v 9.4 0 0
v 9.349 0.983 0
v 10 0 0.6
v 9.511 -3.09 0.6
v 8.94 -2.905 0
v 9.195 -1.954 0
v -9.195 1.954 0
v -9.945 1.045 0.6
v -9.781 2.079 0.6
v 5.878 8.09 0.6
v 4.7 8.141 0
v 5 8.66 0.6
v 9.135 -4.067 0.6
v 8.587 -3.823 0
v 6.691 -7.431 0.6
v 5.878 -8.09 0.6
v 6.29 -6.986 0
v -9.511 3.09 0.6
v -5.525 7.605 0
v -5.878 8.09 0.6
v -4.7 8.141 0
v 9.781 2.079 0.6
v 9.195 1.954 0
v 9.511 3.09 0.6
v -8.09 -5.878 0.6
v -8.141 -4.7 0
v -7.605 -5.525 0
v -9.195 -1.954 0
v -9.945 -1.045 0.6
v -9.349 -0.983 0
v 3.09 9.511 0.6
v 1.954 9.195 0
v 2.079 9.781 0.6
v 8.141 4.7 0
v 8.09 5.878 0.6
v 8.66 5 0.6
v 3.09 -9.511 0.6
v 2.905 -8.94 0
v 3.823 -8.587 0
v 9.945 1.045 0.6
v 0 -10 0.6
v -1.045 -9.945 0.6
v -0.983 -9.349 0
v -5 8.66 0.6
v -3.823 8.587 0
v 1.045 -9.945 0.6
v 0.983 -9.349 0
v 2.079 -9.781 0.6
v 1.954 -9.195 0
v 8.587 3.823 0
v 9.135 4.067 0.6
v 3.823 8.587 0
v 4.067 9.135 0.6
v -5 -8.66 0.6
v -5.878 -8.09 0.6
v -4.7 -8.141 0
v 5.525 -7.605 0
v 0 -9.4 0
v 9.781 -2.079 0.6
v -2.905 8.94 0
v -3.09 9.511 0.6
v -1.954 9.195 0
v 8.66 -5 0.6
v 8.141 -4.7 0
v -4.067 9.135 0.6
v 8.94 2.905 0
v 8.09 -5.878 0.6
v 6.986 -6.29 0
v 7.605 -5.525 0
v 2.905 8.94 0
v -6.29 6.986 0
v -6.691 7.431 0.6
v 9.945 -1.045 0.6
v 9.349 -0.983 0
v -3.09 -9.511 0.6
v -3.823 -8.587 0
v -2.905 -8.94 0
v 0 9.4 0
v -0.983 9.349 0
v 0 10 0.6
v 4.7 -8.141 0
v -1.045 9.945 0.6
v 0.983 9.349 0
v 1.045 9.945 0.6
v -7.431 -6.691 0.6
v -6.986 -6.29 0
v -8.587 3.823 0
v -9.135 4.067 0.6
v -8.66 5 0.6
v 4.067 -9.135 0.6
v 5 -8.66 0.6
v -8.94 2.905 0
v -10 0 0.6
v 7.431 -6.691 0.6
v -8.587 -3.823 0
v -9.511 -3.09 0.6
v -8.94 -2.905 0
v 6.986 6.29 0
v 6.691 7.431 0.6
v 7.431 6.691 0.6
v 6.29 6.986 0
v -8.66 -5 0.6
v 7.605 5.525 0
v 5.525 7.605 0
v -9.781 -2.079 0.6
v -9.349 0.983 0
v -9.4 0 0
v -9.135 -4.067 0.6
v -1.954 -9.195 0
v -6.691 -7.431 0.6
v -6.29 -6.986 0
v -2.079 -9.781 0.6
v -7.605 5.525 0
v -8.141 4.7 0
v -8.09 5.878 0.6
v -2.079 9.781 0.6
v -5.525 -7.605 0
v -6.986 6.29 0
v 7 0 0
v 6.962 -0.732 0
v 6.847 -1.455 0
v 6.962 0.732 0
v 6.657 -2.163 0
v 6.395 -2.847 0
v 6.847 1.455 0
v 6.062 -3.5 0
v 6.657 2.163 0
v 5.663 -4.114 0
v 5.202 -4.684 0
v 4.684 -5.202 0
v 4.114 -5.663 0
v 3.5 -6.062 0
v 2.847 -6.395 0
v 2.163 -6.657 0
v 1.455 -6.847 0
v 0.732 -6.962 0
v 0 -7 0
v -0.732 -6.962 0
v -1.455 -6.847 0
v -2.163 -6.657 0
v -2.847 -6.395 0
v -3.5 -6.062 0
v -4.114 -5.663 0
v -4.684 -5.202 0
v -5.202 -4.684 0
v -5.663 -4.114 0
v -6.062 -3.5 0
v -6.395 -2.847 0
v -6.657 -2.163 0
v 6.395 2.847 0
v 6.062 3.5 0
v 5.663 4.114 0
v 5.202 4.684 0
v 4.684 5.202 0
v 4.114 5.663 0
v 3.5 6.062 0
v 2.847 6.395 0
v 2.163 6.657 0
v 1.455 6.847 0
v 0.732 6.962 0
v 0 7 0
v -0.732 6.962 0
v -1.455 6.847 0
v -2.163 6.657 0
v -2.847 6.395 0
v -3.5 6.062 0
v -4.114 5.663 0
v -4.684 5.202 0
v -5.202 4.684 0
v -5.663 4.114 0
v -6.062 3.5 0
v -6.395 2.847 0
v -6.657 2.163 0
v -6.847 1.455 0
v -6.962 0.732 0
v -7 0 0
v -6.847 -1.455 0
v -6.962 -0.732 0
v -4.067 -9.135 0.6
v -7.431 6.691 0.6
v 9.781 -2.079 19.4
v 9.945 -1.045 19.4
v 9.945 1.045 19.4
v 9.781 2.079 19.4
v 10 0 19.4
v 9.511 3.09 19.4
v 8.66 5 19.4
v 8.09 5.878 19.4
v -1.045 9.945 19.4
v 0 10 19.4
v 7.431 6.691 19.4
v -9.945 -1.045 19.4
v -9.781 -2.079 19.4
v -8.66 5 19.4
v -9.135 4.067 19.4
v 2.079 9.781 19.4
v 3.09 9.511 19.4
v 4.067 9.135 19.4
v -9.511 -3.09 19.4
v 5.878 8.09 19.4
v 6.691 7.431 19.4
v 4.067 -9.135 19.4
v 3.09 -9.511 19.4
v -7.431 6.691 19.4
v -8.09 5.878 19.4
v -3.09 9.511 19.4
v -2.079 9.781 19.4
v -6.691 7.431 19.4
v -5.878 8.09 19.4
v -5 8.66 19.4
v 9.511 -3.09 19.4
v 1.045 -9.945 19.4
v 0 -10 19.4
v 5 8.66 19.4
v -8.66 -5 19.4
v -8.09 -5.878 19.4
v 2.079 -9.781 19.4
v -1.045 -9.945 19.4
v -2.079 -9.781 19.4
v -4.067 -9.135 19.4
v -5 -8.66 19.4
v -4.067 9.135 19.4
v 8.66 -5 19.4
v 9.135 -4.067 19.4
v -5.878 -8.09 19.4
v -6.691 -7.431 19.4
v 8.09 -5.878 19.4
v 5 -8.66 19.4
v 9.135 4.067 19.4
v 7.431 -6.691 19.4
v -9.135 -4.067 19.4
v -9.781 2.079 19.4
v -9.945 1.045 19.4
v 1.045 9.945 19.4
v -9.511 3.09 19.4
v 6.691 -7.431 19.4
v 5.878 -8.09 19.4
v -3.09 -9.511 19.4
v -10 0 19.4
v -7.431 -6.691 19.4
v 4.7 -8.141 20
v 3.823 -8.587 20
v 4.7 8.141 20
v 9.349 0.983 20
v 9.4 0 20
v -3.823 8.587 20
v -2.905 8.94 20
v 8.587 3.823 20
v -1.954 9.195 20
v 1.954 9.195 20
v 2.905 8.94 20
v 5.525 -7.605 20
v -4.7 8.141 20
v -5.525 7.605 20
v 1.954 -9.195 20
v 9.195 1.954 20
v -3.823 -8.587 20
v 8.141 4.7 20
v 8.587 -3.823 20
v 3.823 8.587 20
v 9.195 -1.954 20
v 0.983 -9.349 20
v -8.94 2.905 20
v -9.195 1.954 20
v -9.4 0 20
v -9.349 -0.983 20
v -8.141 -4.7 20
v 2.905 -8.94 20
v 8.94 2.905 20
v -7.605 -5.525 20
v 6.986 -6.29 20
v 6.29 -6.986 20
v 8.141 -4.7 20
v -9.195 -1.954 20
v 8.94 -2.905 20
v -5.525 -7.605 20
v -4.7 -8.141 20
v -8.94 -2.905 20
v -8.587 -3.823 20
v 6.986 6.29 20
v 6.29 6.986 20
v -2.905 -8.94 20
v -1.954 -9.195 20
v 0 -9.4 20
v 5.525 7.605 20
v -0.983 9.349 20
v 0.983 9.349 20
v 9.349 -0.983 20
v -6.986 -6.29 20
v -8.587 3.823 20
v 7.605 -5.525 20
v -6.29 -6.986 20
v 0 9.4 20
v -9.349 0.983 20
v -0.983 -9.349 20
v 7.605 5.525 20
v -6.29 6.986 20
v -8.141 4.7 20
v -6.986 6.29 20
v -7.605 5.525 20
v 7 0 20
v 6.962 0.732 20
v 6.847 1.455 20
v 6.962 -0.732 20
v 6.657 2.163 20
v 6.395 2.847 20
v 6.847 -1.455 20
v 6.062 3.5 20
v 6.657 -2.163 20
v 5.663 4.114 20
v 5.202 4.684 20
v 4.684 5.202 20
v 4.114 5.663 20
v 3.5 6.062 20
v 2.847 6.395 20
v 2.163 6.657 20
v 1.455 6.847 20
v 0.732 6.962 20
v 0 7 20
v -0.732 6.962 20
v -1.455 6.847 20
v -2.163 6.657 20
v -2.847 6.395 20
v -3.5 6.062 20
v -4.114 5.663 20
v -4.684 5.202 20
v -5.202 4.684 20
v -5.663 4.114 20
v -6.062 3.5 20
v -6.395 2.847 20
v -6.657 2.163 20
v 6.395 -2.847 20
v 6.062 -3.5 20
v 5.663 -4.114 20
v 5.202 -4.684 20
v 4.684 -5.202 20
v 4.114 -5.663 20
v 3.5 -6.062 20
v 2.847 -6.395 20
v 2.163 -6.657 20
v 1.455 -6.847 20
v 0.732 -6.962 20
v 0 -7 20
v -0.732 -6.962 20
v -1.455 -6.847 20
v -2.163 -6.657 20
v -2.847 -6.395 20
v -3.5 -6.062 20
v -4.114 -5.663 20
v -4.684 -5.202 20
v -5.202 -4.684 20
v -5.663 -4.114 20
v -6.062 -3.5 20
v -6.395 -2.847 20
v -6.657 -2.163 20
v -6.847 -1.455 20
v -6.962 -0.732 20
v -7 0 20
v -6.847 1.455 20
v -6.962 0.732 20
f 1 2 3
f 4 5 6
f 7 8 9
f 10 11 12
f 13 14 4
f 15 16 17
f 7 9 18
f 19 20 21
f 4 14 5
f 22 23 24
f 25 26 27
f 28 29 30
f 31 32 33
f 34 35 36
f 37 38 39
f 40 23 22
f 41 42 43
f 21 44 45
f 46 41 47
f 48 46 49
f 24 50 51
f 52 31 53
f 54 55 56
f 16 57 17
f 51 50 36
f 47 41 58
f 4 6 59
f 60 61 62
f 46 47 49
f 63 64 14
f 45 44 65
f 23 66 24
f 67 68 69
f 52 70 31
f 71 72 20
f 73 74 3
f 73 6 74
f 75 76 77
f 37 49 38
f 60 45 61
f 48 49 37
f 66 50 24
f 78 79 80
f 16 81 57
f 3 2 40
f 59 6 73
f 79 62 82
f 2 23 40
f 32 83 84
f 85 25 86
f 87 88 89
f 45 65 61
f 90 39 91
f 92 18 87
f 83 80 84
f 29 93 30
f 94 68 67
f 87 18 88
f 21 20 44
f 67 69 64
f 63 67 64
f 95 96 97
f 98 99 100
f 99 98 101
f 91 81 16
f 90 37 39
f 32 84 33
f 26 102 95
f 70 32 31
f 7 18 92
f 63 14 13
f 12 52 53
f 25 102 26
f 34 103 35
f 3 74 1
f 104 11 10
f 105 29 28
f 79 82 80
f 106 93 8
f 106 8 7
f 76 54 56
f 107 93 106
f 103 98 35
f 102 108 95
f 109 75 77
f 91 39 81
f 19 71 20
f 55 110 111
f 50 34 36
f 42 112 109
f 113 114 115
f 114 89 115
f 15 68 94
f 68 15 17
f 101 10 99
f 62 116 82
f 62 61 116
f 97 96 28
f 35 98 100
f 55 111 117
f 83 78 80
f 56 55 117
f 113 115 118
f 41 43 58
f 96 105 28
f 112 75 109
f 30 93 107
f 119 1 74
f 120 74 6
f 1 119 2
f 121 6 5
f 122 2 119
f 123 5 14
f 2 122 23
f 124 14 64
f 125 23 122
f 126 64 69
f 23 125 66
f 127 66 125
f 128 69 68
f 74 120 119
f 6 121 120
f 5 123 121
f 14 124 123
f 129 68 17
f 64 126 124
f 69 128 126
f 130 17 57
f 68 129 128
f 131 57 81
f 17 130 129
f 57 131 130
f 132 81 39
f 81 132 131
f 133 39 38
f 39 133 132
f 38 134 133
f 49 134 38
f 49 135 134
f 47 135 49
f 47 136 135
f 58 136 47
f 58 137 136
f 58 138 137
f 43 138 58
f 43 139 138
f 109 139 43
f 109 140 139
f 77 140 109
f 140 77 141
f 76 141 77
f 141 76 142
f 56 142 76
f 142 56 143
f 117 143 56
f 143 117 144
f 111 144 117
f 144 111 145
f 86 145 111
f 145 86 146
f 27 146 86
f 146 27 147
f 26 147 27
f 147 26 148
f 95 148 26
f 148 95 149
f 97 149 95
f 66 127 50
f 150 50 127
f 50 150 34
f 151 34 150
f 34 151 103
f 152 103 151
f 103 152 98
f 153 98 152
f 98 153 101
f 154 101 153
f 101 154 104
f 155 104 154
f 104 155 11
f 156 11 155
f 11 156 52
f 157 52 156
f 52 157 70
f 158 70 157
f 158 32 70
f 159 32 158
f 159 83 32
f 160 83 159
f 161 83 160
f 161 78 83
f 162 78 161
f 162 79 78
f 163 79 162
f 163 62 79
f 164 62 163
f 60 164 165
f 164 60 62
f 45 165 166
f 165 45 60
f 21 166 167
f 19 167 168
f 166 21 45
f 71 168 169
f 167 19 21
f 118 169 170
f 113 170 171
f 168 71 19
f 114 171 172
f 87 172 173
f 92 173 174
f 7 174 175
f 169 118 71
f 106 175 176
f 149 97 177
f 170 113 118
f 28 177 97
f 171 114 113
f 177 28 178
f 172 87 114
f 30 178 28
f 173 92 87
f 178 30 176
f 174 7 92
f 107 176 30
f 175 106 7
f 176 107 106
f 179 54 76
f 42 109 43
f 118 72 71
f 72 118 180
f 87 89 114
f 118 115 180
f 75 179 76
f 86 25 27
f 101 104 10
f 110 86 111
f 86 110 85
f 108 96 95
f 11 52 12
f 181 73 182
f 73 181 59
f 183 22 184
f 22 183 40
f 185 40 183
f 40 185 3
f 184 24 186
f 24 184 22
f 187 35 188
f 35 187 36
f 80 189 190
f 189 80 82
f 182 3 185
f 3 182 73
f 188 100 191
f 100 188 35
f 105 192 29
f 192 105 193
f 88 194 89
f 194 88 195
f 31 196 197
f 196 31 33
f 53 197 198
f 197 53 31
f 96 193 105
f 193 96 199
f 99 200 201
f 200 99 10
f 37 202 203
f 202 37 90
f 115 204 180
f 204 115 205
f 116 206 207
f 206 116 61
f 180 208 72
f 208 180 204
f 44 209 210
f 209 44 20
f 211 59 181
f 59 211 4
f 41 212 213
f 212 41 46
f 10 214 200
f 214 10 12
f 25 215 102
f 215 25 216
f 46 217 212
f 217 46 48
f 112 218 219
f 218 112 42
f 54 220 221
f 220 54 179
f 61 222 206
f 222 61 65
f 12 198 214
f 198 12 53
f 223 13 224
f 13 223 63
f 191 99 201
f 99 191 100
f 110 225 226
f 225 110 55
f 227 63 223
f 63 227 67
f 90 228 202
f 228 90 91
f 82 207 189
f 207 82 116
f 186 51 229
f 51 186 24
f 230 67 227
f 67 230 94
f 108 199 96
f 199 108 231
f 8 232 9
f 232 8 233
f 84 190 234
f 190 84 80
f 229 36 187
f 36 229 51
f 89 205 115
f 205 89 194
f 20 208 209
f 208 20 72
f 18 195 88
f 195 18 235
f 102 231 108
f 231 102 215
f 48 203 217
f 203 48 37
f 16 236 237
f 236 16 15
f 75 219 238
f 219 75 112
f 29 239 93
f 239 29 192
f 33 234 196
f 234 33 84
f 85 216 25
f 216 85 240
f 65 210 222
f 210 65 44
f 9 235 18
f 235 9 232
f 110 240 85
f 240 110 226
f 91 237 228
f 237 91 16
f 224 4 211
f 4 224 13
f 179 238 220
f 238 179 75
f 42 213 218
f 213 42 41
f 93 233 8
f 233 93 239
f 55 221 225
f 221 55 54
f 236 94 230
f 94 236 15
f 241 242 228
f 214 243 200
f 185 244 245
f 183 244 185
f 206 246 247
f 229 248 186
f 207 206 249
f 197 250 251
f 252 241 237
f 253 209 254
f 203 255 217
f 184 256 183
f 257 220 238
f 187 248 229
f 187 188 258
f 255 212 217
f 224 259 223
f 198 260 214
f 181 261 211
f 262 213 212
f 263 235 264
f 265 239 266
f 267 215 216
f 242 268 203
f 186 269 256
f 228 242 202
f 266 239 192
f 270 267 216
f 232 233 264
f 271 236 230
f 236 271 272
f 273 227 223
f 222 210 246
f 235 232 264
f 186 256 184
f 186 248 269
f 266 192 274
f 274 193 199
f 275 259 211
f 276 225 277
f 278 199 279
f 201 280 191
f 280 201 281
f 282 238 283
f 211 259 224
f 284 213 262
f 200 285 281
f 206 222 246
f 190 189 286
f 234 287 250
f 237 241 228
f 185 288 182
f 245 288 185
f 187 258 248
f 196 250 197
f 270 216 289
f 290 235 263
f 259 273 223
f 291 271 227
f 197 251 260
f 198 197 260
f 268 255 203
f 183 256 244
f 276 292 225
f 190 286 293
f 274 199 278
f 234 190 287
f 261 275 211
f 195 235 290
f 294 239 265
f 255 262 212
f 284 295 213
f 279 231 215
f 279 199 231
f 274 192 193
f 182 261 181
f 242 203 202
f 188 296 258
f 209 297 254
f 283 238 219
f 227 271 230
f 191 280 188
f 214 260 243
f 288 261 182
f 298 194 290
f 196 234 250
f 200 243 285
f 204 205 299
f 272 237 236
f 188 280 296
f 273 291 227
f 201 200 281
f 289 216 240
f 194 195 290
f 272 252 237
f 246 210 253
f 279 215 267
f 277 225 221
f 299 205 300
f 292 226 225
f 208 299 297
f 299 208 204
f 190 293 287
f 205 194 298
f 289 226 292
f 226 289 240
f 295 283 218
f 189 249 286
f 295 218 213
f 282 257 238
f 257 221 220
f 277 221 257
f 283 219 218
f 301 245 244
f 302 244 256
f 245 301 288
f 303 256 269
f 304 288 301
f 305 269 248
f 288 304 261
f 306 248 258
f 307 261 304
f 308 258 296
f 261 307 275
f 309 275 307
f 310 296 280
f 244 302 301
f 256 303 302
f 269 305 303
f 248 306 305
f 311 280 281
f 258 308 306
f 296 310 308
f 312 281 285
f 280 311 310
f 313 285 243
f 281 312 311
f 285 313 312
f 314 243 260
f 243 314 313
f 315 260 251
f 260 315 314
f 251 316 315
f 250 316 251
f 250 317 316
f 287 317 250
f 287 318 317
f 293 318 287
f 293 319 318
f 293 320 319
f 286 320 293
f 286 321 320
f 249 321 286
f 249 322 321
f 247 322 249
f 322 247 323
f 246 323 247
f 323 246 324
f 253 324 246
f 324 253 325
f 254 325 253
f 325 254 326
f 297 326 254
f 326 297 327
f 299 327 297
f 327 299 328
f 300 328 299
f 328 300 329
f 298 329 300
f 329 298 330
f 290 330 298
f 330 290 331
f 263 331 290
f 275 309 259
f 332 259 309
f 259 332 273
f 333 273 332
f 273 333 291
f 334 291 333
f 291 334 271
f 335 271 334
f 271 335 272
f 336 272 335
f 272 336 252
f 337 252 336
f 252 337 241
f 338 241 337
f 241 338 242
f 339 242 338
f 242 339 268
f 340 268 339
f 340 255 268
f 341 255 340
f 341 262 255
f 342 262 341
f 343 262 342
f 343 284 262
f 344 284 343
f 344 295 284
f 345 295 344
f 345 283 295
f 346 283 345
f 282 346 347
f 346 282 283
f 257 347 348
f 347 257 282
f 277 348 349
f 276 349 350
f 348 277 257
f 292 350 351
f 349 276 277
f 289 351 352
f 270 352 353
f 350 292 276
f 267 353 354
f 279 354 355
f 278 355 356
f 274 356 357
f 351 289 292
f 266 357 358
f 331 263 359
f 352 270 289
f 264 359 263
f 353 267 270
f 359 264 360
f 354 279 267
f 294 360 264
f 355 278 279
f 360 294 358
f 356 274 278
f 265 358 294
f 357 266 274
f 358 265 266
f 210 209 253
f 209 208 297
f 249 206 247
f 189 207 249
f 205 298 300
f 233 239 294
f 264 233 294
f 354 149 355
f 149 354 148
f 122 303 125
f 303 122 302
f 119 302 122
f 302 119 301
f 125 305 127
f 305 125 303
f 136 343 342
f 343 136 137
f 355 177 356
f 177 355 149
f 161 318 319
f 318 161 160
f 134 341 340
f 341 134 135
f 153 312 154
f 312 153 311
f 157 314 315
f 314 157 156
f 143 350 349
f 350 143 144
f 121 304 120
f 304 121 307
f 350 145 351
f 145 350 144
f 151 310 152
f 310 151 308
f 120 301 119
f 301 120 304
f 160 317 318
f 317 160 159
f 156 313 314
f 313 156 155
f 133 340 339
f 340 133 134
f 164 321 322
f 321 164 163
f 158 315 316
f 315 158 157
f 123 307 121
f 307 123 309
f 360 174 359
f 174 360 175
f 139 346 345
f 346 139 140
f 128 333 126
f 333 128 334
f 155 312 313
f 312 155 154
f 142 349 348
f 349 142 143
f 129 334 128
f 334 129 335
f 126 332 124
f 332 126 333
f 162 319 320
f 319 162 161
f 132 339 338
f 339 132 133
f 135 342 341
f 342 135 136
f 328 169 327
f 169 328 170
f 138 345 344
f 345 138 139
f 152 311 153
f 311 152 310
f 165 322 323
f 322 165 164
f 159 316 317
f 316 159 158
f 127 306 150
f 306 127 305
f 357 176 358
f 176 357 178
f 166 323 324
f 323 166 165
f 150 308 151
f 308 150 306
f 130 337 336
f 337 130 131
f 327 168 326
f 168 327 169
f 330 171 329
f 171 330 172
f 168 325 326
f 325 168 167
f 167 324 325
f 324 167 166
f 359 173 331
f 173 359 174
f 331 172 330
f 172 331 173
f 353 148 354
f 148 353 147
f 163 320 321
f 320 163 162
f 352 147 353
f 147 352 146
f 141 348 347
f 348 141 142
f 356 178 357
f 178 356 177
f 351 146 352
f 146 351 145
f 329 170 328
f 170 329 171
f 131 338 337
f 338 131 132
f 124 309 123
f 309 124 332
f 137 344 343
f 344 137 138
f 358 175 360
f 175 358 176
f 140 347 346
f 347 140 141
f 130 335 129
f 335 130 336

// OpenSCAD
// Plain sleeve bushing.
$fn = 60;
eps = 0.02;
inner_d = 14;
outer_d = 20;
length = 20;
chamfer = 0.6;
difference() {
    union() {
        cylinder(d1 = outer_d - 2 * chamfer, d2 = outer_d, h = chamfer);
        translate([0, 0, chamfer]) cylinder(d = outer_d, h = length - 2 * chamfer);
        translate([0, 0, length - chamfer]) cylinder(d1 = outer_d, d2 = outer_d - 2 * chamfer, h = chamfer);
    }
    translate([0, 0, -eps]) cylinder(d = inner_d, h = length + 2 * eps);
}
